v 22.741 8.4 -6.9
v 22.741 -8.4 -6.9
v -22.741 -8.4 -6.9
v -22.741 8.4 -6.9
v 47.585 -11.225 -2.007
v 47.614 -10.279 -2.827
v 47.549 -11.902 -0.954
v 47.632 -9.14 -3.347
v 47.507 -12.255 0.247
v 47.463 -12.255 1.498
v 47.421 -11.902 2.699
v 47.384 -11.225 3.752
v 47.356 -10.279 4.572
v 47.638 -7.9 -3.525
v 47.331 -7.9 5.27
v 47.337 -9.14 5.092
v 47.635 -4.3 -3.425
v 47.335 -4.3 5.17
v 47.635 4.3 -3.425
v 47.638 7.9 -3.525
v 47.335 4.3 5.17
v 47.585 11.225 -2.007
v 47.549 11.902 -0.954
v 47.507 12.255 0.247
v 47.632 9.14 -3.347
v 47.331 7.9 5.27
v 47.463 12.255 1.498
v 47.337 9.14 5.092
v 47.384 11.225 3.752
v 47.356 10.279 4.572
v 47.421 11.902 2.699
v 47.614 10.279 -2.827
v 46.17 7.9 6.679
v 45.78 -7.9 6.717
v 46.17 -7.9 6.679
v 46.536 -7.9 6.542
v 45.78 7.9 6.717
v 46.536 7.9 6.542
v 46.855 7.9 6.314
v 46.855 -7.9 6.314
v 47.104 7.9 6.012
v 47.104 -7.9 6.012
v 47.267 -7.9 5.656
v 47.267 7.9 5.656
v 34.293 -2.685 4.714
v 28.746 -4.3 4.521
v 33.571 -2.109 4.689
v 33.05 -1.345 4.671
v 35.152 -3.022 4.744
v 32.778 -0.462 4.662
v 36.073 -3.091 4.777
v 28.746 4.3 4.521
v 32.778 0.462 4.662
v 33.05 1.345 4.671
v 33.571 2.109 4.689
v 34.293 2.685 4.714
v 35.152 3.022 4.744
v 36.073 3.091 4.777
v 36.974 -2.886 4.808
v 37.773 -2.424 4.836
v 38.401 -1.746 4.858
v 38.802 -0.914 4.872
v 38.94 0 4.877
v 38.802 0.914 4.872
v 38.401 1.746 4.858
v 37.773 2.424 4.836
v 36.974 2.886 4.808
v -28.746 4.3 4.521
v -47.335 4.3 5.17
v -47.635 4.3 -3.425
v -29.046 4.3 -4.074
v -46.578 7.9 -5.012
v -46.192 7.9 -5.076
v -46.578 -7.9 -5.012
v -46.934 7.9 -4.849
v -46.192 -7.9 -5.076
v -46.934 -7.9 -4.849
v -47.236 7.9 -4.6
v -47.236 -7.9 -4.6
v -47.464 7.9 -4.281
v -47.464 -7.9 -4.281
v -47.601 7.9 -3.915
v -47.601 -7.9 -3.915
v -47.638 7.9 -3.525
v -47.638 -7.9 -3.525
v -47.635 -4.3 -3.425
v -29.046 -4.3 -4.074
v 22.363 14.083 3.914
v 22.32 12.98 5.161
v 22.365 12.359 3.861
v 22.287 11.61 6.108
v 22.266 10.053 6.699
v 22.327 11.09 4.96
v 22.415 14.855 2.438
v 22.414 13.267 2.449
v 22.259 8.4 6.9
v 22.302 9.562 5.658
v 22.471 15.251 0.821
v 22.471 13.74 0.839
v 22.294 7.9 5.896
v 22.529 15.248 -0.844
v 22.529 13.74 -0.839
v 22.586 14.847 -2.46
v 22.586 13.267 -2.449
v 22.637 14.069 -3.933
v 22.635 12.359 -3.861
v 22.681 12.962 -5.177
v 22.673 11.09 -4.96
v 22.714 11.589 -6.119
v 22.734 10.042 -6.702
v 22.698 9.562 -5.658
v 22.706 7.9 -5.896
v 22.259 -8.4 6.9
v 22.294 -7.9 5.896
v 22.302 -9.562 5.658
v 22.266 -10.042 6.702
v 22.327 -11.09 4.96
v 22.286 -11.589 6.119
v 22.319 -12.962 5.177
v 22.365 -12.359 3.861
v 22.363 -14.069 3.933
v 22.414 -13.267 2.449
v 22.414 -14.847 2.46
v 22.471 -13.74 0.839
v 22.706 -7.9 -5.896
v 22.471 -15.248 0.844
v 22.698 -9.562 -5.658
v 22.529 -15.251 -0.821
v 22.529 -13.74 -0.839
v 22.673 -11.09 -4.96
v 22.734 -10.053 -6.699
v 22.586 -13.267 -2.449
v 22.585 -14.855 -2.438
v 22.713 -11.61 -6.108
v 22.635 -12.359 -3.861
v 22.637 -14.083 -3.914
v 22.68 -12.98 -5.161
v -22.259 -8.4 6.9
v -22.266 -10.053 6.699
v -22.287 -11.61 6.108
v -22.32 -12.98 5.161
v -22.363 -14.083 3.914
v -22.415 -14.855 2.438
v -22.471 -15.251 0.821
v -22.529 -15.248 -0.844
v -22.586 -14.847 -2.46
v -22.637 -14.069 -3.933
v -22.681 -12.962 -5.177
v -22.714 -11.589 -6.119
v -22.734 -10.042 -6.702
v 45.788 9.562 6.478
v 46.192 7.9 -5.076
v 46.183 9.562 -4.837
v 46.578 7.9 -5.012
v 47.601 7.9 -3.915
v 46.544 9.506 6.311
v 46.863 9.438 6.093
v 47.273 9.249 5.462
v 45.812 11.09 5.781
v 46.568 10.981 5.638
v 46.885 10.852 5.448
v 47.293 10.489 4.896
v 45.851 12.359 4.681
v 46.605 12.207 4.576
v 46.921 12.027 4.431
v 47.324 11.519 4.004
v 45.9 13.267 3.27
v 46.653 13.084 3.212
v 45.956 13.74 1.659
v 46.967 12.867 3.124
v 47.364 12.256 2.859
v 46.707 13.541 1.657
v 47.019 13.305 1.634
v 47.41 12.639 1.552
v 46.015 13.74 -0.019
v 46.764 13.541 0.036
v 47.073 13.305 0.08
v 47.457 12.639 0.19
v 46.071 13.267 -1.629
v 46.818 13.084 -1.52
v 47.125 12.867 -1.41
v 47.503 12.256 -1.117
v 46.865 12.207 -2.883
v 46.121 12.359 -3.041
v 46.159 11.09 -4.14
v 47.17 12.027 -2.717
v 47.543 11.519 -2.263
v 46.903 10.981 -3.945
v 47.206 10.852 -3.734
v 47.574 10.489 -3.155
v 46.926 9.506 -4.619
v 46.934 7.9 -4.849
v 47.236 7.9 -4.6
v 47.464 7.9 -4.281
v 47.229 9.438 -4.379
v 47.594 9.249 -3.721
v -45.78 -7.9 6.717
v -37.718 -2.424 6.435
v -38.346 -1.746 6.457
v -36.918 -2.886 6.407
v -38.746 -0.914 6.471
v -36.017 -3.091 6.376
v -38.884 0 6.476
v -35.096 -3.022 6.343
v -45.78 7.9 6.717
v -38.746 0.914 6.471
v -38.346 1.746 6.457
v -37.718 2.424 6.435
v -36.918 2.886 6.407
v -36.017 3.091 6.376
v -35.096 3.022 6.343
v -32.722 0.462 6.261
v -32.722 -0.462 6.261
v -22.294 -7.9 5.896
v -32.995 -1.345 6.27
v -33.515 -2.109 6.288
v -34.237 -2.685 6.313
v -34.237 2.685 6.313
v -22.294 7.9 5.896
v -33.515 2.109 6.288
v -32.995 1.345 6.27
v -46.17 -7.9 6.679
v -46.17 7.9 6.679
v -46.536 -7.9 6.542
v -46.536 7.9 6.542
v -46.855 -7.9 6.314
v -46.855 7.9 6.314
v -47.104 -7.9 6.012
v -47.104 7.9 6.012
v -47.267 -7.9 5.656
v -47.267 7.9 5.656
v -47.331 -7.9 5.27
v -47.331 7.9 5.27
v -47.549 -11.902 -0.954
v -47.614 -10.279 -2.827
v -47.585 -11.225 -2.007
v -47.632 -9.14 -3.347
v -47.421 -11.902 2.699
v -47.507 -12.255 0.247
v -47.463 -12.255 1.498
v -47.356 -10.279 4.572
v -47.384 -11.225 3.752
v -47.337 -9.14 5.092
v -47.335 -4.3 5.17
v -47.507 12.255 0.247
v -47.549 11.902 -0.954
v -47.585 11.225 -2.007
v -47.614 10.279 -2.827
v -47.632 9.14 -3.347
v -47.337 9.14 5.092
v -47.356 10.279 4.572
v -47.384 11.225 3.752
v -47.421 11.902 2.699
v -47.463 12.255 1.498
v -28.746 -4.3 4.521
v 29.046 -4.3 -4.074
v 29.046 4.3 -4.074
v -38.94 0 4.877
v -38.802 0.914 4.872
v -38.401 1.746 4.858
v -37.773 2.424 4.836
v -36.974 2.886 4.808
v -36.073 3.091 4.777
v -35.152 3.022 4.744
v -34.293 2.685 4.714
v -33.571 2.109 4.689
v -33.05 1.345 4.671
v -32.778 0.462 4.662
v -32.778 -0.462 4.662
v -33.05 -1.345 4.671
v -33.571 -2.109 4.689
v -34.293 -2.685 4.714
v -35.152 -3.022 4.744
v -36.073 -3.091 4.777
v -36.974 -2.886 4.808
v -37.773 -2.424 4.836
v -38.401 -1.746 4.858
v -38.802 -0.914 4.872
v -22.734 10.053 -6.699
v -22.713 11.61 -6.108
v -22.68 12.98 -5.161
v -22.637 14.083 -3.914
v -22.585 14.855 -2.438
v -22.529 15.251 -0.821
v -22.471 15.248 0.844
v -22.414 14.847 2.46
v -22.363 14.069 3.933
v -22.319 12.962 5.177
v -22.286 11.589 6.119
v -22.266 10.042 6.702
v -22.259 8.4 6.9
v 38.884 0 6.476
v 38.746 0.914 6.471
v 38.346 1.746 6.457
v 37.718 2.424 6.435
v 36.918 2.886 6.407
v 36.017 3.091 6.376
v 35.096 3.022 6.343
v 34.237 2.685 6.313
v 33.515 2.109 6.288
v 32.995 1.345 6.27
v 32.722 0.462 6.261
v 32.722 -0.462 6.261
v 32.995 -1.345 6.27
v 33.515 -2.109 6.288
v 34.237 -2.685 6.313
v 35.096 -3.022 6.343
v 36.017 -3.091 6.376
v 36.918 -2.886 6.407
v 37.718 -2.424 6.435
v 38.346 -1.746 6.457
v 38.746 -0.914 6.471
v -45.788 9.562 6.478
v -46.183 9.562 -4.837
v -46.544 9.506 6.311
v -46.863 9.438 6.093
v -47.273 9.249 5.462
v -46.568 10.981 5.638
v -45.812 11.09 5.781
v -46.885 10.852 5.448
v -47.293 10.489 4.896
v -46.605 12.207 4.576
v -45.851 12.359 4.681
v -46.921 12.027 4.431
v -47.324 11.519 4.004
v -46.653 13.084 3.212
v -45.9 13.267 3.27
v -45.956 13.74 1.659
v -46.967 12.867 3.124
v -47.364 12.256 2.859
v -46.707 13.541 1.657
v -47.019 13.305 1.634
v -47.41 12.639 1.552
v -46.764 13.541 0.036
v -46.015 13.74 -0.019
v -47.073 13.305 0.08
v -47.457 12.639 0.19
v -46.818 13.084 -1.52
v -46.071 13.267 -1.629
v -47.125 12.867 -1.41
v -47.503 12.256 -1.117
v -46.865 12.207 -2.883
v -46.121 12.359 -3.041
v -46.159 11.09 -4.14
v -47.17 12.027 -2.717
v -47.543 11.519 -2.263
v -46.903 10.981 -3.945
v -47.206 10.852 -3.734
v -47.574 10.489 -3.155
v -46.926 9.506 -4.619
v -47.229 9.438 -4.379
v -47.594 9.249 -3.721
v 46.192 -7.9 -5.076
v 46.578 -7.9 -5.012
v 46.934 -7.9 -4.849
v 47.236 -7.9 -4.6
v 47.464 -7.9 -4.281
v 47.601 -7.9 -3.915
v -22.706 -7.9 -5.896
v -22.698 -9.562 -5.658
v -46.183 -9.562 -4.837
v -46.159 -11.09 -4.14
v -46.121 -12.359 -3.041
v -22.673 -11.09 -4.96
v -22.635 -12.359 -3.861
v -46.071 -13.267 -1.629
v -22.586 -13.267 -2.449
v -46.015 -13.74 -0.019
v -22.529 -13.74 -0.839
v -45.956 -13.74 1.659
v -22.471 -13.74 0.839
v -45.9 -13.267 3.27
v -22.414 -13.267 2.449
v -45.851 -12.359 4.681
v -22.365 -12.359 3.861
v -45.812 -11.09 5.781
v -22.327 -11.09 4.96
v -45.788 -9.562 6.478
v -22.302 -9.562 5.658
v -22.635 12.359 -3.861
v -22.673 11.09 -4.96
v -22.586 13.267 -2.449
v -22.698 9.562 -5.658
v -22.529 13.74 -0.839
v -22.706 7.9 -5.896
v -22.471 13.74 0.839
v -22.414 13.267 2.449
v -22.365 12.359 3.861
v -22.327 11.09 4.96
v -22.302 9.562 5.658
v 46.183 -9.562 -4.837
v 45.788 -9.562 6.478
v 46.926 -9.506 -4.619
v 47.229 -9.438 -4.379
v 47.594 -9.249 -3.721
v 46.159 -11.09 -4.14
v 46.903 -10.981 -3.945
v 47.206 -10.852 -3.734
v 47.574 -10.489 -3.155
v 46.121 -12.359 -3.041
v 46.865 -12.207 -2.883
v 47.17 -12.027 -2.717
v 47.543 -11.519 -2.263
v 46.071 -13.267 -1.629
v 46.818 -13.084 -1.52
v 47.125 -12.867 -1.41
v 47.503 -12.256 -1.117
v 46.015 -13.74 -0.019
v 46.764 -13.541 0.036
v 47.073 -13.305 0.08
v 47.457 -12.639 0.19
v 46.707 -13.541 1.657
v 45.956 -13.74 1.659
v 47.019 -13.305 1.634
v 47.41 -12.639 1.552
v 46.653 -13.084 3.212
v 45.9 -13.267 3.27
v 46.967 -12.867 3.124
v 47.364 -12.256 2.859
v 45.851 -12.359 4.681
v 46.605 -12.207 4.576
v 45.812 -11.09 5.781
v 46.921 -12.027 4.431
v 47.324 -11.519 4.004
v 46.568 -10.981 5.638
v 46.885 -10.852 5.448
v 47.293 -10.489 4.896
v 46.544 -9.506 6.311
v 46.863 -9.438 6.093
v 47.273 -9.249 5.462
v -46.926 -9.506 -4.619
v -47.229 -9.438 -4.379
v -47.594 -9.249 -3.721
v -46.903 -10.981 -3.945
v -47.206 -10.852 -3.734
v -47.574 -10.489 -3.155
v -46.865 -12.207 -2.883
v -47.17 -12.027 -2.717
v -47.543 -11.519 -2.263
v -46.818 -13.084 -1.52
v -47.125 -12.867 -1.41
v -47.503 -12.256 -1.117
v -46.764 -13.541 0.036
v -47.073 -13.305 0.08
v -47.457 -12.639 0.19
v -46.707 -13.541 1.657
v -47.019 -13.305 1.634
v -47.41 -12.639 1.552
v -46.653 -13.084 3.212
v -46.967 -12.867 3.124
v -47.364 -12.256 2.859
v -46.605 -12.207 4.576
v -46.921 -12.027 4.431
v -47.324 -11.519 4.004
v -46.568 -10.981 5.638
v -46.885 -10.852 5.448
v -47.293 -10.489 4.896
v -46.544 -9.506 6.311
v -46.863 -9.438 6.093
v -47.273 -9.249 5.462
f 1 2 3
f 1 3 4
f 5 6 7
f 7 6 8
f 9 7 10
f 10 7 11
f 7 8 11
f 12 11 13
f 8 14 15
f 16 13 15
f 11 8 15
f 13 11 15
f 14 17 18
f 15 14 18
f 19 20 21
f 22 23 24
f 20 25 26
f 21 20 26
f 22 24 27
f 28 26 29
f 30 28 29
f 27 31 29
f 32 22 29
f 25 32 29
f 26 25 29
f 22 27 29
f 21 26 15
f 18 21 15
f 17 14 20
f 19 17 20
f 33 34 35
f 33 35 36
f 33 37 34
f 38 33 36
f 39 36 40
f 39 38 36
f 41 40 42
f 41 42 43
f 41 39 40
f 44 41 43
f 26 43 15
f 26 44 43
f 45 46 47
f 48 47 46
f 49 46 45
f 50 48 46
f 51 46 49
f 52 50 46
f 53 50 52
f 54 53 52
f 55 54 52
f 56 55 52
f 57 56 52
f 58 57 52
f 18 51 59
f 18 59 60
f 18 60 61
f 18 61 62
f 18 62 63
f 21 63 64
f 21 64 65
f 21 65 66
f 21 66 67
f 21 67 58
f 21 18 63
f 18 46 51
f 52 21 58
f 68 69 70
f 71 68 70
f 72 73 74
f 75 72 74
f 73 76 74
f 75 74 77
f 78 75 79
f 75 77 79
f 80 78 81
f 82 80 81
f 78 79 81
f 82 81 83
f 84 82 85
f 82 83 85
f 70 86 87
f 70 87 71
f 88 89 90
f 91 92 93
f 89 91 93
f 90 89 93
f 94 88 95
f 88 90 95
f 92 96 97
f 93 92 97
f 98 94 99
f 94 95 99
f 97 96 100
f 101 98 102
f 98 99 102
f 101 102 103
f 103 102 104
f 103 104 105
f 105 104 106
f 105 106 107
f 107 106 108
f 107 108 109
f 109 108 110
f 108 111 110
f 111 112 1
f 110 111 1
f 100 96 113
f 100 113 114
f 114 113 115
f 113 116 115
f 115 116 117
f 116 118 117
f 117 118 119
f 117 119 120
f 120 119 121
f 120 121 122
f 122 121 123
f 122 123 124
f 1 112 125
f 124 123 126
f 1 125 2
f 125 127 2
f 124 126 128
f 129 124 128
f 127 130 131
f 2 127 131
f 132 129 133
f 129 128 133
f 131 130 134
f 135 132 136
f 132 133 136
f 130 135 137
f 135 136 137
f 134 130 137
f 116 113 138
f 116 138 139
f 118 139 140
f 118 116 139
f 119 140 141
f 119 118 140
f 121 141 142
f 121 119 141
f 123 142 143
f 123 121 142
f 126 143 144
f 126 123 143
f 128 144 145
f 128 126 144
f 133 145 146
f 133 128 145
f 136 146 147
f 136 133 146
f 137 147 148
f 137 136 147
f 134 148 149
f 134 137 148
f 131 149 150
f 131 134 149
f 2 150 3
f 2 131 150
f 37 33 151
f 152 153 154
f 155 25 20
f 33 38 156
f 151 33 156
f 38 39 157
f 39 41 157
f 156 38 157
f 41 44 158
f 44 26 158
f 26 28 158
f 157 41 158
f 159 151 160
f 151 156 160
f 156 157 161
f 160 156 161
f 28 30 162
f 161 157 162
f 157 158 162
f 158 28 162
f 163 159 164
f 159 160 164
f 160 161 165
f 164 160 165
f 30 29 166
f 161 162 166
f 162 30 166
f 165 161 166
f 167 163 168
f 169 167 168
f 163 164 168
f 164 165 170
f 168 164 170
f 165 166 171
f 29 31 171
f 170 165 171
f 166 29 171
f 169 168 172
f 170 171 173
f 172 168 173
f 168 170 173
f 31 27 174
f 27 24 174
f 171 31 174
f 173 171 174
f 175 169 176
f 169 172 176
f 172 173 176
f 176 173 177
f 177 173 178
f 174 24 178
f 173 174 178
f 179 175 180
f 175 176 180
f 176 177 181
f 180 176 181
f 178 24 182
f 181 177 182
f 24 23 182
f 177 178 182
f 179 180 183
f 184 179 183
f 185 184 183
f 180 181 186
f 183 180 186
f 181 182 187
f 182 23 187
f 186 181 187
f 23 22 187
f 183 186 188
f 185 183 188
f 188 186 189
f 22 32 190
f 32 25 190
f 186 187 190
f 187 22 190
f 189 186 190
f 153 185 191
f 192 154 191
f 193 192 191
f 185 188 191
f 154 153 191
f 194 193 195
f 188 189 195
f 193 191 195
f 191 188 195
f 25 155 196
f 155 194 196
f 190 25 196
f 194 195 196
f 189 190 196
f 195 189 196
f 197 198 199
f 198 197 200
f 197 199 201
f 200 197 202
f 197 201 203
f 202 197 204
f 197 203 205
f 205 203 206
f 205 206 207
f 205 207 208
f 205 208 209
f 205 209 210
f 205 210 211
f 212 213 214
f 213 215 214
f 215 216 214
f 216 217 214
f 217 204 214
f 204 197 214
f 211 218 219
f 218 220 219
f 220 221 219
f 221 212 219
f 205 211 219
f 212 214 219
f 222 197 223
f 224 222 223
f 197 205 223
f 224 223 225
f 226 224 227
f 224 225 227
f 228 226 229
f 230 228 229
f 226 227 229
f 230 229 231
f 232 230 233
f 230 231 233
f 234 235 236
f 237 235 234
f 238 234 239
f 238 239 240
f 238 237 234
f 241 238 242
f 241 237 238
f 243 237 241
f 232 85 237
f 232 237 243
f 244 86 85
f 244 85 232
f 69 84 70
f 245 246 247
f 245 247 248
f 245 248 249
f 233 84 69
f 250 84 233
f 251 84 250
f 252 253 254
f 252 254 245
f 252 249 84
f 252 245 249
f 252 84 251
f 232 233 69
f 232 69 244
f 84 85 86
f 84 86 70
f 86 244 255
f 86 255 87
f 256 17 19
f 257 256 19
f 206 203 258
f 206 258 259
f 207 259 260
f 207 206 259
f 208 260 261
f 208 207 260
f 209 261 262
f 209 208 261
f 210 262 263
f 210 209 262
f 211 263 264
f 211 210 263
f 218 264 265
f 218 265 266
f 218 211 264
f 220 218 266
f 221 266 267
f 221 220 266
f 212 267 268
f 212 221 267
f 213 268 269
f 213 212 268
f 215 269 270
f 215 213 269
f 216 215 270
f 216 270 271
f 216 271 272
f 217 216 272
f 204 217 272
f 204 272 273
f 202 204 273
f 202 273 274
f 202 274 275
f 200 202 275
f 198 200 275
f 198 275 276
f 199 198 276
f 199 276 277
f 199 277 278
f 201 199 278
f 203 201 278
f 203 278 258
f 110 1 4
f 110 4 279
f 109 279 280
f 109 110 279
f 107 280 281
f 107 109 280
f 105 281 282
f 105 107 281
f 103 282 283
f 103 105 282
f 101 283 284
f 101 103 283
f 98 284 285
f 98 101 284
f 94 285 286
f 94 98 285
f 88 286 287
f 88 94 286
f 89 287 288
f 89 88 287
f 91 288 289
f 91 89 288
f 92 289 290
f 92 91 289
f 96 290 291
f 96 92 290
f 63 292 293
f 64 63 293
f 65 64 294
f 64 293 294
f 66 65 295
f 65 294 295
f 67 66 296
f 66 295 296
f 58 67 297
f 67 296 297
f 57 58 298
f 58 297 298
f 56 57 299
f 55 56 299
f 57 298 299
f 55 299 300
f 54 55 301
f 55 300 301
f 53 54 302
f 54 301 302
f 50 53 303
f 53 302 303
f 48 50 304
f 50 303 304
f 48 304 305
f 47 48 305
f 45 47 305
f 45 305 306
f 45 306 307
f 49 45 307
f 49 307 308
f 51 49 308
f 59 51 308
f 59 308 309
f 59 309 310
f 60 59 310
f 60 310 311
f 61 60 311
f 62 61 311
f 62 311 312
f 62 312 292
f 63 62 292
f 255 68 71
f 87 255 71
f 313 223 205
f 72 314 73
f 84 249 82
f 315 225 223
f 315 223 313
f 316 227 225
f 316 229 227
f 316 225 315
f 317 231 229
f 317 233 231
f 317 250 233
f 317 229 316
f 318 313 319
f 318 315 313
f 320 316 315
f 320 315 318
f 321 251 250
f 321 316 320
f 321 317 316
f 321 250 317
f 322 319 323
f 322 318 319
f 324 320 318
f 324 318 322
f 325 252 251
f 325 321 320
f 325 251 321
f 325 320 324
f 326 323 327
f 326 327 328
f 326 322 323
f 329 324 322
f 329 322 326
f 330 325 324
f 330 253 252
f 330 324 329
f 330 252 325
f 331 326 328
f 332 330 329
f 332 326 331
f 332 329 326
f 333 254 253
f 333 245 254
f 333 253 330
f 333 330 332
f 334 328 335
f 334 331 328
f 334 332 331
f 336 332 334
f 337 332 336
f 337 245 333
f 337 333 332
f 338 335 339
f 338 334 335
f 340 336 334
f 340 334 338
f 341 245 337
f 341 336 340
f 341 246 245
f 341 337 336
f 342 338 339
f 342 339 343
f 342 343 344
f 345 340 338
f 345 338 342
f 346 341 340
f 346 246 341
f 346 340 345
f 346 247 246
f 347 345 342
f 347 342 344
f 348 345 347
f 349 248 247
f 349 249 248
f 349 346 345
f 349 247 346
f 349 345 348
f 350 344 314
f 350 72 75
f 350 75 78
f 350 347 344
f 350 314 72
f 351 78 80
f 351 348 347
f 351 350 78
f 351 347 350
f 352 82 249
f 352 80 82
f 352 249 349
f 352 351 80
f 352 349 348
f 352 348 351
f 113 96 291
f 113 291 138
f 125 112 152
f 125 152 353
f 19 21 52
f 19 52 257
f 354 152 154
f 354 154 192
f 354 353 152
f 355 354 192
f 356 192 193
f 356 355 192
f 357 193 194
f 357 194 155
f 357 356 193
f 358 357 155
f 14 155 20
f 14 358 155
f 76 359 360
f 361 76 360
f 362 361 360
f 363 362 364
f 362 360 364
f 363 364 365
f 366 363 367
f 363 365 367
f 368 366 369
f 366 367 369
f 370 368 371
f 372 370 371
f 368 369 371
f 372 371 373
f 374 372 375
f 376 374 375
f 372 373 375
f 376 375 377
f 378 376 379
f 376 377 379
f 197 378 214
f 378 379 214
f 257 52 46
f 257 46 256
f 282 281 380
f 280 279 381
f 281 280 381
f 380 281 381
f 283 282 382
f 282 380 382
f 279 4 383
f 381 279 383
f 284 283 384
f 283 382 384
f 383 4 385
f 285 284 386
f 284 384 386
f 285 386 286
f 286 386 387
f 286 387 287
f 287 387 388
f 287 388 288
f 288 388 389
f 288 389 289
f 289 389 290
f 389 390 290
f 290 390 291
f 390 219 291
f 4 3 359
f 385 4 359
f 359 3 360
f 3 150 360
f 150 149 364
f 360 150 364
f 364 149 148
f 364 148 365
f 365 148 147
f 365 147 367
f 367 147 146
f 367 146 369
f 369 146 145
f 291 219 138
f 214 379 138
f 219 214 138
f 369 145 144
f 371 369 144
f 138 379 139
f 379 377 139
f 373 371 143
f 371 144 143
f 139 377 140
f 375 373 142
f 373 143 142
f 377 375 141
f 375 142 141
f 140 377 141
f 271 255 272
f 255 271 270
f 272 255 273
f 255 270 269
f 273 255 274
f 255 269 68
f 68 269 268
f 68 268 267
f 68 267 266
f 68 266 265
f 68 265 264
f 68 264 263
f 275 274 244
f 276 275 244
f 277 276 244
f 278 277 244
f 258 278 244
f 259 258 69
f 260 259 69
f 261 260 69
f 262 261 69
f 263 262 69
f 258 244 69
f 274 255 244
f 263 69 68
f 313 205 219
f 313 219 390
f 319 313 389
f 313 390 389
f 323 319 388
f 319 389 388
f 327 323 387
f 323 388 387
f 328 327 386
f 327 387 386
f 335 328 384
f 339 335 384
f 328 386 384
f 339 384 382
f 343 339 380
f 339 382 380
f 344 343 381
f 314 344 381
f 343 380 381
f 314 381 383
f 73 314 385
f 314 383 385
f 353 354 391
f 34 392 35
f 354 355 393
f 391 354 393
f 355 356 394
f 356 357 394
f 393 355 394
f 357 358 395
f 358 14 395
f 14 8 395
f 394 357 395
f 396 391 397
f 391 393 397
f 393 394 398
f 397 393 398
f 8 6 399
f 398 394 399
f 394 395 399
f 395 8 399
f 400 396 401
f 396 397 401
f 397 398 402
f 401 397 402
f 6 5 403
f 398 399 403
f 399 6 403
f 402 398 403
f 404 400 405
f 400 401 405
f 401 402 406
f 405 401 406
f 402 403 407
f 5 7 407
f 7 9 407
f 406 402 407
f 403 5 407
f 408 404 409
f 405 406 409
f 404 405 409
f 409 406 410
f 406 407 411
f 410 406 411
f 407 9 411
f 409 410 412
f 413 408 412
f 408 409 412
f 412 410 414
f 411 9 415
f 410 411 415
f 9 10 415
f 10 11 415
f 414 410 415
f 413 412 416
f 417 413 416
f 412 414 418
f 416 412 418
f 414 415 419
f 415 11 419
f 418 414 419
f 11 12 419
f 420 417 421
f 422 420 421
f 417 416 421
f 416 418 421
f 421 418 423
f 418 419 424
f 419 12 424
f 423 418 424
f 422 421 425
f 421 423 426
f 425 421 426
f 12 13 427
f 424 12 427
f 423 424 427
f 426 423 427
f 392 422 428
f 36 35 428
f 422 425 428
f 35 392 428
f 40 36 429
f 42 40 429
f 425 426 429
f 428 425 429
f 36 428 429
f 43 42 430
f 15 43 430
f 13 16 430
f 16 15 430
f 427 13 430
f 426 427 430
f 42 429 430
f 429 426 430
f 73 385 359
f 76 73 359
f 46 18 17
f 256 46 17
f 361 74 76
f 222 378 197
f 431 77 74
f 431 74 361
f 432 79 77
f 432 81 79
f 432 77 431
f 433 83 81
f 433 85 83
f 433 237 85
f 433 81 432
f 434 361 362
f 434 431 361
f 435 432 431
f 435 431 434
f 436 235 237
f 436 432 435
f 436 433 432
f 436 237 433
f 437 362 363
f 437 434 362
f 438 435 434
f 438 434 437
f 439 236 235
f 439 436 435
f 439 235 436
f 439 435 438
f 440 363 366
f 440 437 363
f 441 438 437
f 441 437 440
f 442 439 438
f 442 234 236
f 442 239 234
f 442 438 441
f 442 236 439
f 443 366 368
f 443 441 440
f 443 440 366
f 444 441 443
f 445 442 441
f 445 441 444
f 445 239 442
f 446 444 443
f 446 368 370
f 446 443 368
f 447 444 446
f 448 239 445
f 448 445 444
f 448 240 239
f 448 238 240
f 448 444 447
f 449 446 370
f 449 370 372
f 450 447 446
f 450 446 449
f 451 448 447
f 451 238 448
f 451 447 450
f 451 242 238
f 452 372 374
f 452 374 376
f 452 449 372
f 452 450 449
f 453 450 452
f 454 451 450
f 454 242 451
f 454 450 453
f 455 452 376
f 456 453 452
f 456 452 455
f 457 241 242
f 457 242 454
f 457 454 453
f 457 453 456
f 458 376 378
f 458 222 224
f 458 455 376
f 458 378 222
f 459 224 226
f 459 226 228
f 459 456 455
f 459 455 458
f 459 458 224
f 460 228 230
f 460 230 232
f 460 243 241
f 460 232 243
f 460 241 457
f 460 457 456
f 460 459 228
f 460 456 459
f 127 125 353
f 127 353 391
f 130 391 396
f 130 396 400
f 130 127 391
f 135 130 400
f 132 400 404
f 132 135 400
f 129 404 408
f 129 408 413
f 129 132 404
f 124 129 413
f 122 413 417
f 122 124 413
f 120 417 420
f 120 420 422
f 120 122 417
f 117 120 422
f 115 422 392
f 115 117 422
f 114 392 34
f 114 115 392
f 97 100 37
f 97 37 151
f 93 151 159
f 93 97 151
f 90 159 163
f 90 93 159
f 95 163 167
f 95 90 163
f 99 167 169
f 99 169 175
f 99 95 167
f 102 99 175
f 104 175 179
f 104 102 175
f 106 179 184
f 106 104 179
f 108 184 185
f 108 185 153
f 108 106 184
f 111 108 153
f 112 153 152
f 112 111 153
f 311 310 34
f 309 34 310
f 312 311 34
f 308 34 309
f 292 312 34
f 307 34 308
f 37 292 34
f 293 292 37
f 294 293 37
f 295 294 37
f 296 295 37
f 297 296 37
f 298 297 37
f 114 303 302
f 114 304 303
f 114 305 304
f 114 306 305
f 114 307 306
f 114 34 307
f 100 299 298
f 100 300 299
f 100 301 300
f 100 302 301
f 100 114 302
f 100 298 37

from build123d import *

# Parameters (mm, degrees)
CENTER_DEPTH         = 23
CENTER_DEPTH_BACK    = 23
ANGLE_CUT_DEPTH      = 29.472794032
ANGLE_CUT_DEPTH_BACK = 29.472794032
END_DEPTH            = 25
FILLET2_R            = 1.5
SKETCH10_W           = 8.6
SKETCH10_H           = 8.6
SQUARE_HOLE_DEPTH    = 18.6
ROUND_HOLE_REACH     = 53.623
SKETCH11_R           = 3.1
FILLET2_OF_MIRROR2_R = 1.5


with BuildPart() as part:
    # Sketch1 → Center (new, two sides: drawn at the far end of the back side and taken through both)
    with BuildSketch(Plane.ZY.offset(-CENTER_DEPTH_BACK)):
        with BuildLine():
            Line((6.9, 8.4), (6.9, -8.4))
            ThreePointArc((6.9, -8.4), (0, -15.3), (-6.9, -8.4))
            Line((-6.9, -8.4), (-6.9, 8.4))
            ThreePointArc((-6.9, 8.4), (0, 15.3), (6.9, 8.4))
        make_face()
    extrude(amount=CENTER_DEPTH + CENTER_DEPTH_BACK)

    # Sketch8 → Angle Cut (cut, two sides: drawn at the far end of the back side and taken through both)
    with BuildSketch(Plane(origin=(0, 0, 0), x_dir=(1, 0, 0), z_dir=(0, 1, 0)).offset(-ANGLE_CUT_DEPTH_BACK)):
        Polygon((-32.849207695, 10), (-22.849207695, 10), (-22.150792305, -10), (-32.849207695, -10), align=None)
        Polygon((32.849207695, -10), (22.150792305, -10), (22.849207695, 10), (32.849207695, 10), align=None)
    extrude(amount=ANGLE_CUT_DEPTH + ANGLE_CUT_DEPTH_BACK, mode=Mode.SUBTRACT)

    # Sketch9 → End (add)
    with BuildSketch(Plane(origin=(22.472595565, 0, 0.78476033), x_dir=(0.03489949670249425, 0, -0.999390827019096), z_dir=(0.999390827019096, 0, 0.03489949670249425))):
        with BuildLine():
            Line((-5.114761324, -7.9), (-5.114761324, 7.9))
            ThreePointArc((-5.114761324, 7.9), (0.785238676, 13.8), (6.685238676, 7.9))
            Line((6.685238676, 7.9), (6.685238676, -7.9))
            ThreePointArc((6.685238676, -7.9), (0.785238676, -13.8), (-5.114761324, -7.9))
        make_face()
    end = extrude(amount=END_DEPTH)

    # Fillet2
    fillet2_edges = [part.edges().sort_by_distance(p)[0] for p in [
        (47.484770675, -13.8, 0.872487418),
        (47.690677706, 0, -5.023918462),
        (47.484770675, 13.8, 0.872487418),
        (47.278863645, 0, 6.768893297),
    ]]
    fillet(fillet2_edges, radius=FILLET2_R)

    # Sketch10 → Square Hole (cut)
    with BuildSketch(Plane(origin=(47.457366241, 0, 1.657247747), x_dir=(0.03489949670249425, 0, -0.999390827019096), z_dir=(0.999390827019096, 0, 0.03489949670249425))):
        with Locations((0.785238676, 0)):
            Rectangle(SKETCH10_W, SKETCH10_H)
    square_hole = extrude(amount=-SQUARE_HOLE_DEPTH, mode=Mode.SUBTRACT)

    # Sketch11 → Round Hole (cut, up to next)
    with BuildSketch(Plane(origin=(-0.178502596, 0, 5.11164555), x_dir=(0.999390827019096, 0, 0.03489949670249425), z_dir=(-0.03489949670249425, 0, 0.999390827019096)), mode=Mode.PRIVATE) as round_hole_sk1:
        with Locations((35.986293608, 0)):
            Circle(SKETCH11_R)
    round_hole_tool1 = extrude(round_hole_sk1.sketch, amount=-ROUND_HOLE_REACH, mode=Mode.PRIVATE) & part.part
    round_hole = round_hole_tool1.solids().sort_by_distance((35.785869, 0, 6.367549))[0]
    add(round_hole, mode=Mode.SUBTRACT)

    # Mirror2: End, Square Hole, Round Hole across plane
    add(end.mirror(Plane(origin=(0, 0, 0), x_dir=(0, 0, 1), z_dir=(1, 0, 0))))
    add(square_hole.mirror(Plane(origin=(0, 0, 0), x_dir=(0, 0, 1), z_dir=(1, 0, 0))), mode=Mode.SUBTRACT)
    add(round_hole.mirror(Plane(origin=(0, 0, 0), x_dir=(0, 0, 1), z_dir=(1, 0, 0))), mode=Mode.SUBTRACT)

    # Fillet2 of Mirror2
    fillet2_of_mirror2_edges = [part.edges().sort_by_distance(p)[0] for p in [
        (-47.484770675, -13.8, 0.872487418),
        (-47.690677706, 0, -5.023918462),
        (-47.484770675, 13.8, 0.872487418),
        (-47.278863645, 0, 6.768893297),
    ]]
    fillet(fillet2_of_mirror2_edges, radius=FILLET2_OF_MIRROR2_R)


solid = part.part
